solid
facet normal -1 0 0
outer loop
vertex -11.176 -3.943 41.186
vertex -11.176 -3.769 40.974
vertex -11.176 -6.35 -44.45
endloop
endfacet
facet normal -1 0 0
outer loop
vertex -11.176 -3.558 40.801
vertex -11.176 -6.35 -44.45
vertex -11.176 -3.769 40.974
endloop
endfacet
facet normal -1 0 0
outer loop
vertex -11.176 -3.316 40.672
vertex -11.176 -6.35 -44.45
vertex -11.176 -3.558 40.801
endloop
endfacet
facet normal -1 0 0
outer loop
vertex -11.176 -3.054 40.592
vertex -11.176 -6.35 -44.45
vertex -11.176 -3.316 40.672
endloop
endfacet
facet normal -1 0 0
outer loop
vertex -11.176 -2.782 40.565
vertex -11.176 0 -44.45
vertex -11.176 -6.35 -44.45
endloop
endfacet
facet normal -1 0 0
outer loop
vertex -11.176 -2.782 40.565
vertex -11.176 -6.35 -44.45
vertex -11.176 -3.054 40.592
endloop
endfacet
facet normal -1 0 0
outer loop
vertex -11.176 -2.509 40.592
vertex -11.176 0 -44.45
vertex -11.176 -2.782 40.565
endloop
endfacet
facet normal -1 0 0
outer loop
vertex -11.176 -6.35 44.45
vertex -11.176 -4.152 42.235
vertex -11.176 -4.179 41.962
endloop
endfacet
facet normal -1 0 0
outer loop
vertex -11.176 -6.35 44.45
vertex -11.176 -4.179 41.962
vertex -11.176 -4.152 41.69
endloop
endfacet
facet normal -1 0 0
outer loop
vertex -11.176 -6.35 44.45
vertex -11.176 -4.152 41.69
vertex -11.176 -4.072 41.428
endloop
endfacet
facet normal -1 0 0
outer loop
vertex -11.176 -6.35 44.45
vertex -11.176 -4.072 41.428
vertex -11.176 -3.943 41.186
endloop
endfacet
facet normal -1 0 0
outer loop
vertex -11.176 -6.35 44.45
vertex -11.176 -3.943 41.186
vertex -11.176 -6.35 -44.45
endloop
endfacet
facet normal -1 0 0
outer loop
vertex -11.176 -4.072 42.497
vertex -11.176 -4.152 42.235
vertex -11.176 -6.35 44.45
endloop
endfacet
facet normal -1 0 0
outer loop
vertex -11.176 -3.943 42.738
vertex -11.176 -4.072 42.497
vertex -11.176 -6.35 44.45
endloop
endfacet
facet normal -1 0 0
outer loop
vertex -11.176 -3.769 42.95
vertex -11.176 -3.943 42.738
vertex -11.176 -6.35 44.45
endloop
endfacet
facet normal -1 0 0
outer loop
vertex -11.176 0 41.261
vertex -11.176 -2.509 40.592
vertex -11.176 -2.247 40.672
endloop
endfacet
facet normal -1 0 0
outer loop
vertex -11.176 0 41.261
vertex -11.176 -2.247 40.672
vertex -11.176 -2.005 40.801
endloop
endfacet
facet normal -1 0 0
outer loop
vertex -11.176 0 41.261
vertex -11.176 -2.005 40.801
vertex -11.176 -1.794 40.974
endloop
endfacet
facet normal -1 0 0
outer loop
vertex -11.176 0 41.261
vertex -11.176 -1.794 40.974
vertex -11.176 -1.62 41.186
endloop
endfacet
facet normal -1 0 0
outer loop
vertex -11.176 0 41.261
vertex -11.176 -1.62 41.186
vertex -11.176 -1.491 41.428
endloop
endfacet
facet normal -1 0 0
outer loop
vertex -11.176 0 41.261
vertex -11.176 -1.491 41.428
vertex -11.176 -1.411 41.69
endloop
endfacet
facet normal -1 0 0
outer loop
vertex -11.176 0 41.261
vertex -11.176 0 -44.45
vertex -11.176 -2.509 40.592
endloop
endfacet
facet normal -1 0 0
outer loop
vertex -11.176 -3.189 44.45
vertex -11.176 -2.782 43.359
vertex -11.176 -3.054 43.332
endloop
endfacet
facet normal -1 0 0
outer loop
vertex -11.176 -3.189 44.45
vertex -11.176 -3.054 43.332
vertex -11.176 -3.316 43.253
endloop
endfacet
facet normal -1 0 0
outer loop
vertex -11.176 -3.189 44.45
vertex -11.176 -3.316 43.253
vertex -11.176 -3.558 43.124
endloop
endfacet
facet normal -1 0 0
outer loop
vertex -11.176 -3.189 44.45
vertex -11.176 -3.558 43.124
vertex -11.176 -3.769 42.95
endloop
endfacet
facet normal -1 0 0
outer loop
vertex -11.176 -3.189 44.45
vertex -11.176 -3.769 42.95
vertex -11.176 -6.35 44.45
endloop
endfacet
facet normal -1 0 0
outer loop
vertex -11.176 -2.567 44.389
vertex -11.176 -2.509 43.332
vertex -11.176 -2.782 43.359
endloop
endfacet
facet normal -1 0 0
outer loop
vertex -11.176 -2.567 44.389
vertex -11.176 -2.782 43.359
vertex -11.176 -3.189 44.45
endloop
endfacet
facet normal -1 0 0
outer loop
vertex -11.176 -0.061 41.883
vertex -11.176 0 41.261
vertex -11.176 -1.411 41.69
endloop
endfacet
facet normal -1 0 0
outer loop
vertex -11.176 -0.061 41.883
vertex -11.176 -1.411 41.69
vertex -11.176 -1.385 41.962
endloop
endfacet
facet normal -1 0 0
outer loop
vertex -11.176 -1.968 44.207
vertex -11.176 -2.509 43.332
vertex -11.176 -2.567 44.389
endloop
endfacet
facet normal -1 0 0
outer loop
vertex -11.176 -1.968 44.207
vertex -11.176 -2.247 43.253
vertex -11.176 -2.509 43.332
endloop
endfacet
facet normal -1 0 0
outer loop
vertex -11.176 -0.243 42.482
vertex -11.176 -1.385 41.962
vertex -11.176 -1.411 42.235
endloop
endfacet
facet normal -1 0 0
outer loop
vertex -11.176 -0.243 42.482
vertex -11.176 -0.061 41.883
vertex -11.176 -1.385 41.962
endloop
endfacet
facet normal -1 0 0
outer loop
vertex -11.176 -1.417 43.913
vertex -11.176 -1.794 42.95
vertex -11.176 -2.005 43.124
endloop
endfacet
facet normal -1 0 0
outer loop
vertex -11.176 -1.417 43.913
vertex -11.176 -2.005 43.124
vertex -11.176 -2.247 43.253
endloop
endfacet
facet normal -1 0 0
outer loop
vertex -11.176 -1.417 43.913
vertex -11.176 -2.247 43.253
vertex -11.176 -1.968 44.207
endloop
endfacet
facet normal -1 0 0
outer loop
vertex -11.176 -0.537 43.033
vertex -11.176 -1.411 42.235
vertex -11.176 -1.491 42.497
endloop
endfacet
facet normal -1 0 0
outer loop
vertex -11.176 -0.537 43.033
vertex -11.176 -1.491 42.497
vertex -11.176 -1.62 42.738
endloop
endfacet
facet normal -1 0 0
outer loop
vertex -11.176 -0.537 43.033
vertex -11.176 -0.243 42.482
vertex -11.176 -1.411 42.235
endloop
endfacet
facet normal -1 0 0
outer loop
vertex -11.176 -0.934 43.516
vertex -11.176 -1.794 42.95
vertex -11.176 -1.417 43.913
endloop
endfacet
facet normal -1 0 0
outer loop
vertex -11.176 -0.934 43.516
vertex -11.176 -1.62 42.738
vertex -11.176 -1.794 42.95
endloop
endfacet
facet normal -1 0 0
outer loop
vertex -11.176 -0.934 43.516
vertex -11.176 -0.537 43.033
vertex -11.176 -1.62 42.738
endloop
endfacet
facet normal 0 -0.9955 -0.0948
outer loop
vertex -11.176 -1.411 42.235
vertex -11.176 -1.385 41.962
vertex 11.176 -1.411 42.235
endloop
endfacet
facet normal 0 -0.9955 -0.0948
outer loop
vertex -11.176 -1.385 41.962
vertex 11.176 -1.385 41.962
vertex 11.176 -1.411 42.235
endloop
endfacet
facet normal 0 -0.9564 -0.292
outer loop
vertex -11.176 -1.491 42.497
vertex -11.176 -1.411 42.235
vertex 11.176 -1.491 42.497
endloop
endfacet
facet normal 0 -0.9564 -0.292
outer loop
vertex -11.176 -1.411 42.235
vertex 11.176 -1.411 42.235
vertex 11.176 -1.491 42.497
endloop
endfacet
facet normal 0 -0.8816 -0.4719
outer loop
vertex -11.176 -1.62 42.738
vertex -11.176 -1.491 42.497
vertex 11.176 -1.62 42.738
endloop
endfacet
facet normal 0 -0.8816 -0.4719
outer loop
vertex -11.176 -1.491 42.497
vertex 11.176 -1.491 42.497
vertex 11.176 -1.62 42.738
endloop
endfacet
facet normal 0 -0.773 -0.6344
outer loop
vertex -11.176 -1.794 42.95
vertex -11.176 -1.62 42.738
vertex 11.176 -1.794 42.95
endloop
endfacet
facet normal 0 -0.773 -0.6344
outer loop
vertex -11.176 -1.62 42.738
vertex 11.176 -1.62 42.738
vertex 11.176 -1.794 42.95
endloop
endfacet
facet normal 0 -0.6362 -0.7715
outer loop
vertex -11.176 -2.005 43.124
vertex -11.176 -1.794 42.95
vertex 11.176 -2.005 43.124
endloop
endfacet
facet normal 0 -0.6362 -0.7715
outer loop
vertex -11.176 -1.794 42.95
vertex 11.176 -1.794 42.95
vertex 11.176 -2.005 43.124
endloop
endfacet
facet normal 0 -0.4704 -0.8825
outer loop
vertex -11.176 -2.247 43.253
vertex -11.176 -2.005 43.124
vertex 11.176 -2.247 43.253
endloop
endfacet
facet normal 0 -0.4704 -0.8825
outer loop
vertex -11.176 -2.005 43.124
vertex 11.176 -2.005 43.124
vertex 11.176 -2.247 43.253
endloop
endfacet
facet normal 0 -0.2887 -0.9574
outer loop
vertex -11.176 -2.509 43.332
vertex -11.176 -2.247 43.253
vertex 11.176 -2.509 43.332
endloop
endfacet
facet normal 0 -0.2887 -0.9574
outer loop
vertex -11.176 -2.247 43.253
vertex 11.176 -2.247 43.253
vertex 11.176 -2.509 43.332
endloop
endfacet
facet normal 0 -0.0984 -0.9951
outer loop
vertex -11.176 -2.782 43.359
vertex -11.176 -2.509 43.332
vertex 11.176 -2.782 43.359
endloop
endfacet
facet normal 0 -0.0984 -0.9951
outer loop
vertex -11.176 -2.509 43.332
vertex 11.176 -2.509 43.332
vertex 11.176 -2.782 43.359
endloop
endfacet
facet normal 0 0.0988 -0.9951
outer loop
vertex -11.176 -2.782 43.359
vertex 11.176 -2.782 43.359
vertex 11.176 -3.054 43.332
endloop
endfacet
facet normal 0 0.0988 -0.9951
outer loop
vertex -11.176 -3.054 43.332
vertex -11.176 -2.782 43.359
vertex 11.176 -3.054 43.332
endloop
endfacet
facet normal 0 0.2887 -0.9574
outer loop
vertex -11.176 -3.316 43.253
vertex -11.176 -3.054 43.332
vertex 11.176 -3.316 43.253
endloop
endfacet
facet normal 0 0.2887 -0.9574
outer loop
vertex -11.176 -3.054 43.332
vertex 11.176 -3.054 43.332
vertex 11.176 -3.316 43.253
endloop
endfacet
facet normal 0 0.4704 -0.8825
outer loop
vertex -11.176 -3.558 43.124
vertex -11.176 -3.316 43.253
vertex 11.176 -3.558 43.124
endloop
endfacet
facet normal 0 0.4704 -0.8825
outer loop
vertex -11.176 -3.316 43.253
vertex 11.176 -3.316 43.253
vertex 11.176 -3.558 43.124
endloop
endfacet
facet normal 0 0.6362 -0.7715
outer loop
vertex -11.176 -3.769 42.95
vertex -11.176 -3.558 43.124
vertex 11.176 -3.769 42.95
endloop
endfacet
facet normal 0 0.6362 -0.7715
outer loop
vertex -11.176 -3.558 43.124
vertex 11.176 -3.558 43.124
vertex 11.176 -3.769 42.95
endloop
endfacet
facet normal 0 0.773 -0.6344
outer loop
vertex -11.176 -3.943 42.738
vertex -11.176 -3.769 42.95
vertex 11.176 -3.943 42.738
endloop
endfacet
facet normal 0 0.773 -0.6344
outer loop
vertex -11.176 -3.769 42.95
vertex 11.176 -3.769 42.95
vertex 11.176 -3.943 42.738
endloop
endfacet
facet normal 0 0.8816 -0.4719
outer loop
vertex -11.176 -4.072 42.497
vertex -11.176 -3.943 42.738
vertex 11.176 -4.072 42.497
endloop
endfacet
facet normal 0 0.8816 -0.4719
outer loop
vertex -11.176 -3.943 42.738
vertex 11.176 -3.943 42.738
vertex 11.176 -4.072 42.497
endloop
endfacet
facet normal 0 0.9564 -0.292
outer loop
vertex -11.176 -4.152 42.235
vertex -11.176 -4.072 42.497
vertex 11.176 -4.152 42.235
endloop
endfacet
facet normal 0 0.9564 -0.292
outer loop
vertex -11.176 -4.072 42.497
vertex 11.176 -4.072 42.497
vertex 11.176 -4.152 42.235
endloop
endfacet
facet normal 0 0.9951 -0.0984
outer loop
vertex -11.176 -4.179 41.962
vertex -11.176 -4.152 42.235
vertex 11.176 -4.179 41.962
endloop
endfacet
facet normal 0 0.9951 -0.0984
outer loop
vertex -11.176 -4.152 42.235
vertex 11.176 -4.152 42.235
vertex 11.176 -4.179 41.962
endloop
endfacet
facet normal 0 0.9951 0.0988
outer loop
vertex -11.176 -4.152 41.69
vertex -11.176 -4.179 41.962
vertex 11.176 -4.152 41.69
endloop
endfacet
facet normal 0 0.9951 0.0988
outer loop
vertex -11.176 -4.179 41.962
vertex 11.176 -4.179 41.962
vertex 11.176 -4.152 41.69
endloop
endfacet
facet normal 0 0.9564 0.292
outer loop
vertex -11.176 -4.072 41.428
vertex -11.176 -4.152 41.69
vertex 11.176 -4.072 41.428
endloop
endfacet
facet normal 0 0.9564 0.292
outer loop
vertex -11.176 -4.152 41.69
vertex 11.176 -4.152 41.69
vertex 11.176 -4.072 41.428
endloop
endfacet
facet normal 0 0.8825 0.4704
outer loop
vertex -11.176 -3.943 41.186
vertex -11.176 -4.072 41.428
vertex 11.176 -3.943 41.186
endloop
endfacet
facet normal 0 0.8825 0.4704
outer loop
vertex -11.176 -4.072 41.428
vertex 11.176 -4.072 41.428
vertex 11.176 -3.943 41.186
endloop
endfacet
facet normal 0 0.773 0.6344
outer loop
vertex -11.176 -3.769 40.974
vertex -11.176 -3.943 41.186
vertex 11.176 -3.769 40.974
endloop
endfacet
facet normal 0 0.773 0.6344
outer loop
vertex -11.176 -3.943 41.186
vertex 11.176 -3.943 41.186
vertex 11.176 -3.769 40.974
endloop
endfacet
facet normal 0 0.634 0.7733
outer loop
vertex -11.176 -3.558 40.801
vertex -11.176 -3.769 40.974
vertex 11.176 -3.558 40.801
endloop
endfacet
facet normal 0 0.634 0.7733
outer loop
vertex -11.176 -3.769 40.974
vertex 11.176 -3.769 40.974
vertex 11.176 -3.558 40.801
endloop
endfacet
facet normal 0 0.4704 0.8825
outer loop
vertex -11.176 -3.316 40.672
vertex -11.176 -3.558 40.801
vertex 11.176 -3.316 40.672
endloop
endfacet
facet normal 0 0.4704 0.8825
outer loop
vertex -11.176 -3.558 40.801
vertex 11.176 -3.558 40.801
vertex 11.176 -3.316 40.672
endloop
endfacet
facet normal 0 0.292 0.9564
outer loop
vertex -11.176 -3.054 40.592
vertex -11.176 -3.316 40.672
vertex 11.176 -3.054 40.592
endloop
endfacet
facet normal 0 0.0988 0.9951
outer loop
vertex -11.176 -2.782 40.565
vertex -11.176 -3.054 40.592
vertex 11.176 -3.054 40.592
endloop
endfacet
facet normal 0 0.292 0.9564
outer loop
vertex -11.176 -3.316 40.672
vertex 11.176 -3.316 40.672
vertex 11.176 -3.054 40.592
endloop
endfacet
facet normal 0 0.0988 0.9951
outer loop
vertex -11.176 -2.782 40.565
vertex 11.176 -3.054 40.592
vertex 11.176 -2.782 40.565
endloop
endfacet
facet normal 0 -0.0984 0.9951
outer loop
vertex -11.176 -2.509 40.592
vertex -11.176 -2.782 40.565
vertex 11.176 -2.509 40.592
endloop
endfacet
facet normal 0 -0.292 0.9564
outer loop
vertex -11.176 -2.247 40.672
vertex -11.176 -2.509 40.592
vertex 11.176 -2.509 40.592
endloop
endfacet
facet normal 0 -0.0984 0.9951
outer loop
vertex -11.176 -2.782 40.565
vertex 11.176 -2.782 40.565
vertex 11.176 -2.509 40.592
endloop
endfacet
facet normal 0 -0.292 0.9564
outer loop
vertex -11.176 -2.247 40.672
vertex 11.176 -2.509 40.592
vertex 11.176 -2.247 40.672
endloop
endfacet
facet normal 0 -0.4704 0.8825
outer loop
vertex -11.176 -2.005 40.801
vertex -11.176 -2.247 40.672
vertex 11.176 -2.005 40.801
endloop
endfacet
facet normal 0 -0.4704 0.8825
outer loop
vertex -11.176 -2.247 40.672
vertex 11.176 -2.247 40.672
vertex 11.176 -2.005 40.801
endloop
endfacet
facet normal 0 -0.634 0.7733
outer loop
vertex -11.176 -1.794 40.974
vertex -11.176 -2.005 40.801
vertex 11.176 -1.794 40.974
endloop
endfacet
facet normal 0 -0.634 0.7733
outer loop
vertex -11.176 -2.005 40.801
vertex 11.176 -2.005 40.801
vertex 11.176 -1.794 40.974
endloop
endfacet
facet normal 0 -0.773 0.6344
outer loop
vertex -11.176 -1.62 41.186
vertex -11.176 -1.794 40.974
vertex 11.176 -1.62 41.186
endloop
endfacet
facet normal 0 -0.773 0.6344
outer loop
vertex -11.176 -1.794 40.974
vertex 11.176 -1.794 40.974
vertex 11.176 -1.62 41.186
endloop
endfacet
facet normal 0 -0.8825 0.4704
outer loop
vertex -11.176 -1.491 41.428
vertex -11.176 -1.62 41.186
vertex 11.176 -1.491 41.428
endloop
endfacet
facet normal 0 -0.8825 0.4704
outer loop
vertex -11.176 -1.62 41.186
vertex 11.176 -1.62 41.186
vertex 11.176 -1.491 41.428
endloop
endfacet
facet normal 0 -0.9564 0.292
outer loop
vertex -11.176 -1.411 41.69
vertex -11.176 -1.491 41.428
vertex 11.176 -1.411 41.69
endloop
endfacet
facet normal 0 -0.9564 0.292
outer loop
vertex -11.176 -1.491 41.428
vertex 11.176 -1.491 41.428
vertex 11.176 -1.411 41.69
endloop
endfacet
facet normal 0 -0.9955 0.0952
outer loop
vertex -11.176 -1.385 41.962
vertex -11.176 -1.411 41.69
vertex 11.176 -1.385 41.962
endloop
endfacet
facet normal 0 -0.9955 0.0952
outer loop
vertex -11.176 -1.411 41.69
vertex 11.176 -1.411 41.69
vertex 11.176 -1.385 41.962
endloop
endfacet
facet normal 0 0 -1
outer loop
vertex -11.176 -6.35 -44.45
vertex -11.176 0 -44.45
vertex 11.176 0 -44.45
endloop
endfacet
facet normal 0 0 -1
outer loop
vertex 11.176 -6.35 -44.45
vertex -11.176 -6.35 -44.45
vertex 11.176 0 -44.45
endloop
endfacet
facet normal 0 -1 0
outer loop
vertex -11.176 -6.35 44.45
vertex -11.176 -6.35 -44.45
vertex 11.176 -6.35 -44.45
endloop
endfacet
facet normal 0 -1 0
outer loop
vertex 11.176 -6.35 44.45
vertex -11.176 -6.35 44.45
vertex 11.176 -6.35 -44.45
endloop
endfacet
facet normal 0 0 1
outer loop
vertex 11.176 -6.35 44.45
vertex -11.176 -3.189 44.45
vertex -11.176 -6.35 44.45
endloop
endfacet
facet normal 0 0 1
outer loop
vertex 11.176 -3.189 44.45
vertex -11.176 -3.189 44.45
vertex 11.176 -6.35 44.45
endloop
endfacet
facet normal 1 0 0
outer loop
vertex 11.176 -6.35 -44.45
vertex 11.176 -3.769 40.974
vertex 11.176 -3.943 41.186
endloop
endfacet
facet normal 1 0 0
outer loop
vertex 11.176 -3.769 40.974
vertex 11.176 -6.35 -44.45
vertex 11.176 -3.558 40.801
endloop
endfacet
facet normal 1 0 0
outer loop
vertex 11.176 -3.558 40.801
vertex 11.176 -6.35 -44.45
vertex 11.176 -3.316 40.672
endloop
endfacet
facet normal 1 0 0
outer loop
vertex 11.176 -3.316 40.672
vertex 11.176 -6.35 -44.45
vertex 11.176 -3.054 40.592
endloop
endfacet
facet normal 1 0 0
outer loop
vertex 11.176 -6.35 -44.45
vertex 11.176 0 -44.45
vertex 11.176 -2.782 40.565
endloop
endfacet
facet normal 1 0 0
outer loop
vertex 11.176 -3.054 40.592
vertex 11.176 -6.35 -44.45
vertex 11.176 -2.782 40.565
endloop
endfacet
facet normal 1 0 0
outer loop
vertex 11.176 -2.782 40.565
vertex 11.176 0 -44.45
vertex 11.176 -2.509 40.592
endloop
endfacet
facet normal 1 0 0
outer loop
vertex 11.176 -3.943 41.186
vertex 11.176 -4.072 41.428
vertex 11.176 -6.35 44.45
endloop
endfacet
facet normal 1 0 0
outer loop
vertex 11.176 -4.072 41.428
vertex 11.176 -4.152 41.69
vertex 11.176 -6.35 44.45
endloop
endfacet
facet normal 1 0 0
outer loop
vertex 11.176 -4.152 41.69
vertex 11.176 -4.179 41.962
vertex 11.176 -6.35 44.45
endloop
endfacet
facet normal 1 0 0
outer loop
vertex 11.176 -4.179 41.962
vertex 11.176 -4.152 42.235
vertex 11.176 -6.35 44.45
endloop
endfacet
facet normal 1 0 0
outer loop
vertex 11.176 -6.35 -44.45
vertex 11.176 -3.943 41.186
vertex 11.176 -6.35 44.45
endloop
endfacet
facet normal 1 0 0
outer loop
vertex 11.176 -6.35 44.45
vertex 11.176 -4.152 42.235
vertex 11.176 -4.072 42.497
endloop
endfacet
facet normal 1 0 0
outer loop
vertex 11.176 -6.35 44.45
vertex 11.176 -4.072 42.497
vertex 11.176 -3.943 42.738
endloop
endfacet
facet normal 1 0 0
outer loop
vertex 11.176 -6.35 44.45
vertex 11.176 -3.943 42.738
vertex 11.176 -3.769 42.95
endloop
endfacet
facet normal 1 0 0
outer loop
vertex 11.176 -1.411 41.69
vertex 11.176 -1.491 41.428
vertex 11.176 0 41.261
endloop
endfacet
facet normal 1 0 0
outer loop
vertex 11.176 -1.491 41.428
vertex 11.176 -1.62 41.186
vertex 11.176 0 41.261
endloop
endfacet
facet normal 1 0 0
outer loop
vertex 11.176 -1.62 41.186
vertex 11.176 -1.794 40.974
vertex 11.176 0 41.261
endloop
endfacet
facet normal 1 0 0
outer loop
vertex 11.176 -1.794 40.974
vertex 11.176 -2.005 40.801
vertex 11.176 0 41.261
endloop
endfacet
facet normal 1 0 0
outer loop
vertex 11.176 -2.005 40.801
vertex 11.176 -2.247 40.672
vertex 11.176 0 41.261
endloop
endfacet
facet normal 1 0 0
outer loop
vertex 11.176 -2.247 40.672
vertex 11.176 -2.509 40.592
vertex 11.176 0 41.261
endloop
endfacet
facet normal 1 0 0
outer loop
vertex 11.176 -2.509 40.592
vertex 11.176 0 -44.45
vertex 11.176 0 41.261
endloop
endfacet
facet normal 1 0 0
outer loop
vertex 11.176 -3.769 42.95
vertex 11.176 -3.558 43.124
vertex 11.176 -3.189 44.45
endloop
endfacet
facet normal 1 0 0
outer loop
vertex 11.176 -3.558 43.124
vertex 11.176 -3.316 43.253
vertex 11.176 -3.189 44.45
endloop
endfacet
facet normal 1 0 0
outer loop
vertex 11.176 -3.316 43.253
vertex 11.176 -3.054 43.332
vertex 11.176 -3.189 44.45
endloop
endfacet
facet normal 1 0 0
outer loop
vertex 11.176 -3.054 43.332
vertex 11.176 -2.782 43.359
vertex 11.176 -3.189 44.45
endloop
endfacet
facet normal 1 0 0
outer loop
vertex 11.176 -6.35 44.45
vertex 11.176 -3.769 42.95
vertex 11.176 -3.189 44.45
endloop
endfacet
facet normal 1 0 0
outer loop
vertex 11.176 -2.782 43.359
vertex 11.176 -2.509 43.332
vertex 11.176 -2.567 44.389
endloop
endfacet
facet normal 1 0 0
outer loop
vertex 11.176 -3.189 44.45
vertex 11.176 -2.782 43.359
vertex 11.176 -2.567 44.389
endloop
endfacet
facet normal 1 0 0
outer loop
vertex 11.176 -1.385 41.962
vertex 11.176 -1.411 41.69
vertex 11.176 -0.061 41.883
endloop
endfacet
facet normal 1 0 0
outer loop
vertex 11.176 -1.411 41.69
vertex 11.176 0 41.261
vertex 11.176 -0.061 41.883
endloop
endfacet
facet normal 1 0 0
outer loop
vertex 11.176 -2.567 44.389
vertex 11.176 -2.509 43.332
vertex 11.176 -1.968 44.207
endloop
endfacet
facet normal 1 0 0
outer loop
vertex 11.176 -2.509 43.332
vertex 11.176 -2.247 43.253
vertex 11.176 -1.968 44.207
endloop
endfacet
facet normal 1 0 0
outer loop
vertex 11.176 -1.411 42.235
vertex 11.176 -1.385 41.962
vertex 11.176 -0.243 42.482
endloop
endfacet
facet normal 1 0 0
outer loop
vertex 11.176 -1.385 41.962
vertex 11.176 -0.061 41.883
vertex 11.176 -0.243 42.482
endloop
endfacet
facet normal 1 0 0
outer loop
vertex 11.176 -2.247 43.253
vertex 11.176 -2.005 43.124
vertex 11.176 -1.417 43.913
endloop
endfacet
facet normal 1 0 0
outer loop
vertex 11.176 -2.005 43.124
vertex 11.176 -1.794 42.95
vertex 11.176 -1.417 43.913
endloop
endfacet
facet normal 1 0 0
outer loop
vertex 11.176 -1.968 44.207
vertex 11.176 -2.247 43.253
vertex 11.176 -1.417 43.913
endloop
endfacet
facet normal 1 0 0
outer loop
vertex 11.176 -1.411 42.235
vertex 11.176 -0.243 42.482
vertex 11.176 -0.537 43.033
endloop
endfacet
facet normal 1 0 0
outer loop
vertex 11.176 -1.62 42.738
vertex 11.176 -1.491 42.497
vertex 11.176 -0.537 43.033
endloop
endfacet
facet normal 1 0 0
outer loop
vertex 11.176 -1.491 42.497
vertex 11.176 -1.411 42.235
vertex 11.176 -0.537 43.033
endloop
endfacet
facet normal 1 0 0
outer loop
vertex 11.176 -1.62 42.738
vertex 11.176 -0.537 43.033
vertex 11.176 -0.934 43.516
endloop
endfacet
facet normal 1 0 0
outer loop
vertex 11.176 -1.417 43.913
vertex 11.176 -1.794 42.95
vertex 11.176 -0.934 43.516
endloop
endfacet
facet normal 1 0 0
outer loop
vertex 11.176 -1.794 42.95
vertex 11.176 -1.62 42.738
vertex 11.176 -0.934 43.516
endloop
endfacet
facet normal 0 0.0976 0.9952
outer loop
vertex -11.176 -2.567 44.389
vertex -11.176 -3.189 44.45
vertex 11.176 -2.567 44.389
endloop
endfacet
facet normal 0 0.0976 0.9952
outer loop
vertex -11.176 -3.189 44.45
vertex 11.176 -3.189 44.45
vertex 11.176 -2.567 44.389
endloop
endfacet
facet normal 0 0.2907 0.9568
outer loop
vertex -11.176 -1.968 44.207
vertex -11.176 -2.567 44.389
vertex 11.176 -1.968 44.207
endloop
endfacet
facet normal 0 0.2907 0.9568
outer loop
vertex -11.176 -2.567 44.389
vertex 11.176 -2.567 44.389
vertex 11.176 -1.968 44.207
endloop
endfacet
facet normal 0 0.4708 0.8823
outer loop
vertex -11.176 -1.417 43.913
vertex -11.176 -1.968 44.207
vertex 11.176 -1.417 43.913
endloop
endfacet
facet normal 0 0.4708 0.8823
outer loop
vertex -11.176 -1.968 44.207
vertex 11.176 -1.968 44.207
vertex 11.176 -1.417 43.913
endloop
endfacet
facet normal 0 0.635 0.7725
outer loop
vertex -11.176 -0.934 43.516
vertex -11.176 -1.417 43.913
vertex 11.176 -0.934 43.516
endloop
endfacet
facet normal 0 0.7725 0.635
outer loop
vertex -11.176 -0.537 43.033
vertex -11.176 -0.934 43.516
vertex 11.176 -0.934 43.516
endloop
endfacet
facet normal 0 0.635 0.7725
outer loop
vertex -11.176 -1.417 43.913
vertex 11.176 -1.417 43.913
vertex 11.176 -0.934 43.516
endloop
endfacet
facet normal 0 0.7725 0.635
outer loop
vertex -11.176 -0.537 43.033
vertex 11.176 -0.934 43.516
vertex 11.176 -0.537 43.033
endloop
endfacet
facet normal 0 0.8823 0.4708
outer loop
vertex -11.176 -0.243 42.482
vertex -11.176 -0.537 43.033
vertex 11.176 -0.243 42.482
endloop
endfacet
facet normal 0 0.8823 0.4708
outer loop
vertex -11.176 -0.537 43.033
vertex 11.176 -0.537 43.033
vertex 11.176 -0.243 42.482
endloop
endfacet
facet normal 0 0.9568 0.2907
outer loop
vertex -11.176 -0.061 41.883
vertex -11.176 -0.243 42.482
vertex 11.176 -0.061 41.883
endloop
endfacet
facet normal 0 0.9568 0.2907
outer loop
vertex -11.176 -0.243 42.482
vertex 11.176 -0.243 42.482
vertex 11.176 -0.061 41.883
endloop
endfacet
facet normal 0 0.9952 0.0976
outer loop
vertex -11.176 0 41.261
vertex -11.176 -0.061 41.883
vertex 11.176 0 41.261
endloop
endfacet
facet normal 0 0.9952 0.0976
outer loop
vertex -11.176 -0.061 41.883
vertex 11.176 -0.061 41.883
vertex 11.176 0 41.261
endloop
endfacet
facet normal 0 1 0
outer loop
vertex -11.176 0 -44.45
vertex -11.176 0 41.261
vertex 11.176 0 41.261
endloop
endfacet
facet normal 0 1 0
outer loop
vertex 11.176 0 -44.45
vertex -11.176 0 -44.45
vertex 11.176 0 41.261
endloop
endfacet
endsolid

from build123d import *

# Parameters (mm, degrees)
F0_W          = 22.352
F0_H          = 88.9
F1_DEPTH      = 6.35
F2_R          = 1.397
F3_DEPTH      = 15.24
F3_DEPTH_BACK = 15.24
F4_R          = 3.188693


with BuildPart() as f1:
    # F0 (on Front) → F1 (new body)
    with BuildSketch(Plane.XZ):
        Rectangle(F0_W, F0_H)
    extrude(amount=F1_DEPTH)

    # F2 (on Right) → F3 (cut, two sides)
    with BuildSketch(Plane.YZ) as f3_sk:
        with Locations((-2.781508, 41.962247)):
            Circle(F2_R)
    extrude(amount=F3_DEPTH, mode=Mode.SUBTRACT)
    extrude(f3_sk.sketch, amount=-F3_DEPTH_BACK, mode=Mode.SUBTRACT)

    # F4
    f4_edges = [f1.edges().sort_by_distance(p)[0] for p in [
        (0, 0, 44.45),
    ]]
    fillet(f4_edges, radius=F4_R)


solid = f1.part
